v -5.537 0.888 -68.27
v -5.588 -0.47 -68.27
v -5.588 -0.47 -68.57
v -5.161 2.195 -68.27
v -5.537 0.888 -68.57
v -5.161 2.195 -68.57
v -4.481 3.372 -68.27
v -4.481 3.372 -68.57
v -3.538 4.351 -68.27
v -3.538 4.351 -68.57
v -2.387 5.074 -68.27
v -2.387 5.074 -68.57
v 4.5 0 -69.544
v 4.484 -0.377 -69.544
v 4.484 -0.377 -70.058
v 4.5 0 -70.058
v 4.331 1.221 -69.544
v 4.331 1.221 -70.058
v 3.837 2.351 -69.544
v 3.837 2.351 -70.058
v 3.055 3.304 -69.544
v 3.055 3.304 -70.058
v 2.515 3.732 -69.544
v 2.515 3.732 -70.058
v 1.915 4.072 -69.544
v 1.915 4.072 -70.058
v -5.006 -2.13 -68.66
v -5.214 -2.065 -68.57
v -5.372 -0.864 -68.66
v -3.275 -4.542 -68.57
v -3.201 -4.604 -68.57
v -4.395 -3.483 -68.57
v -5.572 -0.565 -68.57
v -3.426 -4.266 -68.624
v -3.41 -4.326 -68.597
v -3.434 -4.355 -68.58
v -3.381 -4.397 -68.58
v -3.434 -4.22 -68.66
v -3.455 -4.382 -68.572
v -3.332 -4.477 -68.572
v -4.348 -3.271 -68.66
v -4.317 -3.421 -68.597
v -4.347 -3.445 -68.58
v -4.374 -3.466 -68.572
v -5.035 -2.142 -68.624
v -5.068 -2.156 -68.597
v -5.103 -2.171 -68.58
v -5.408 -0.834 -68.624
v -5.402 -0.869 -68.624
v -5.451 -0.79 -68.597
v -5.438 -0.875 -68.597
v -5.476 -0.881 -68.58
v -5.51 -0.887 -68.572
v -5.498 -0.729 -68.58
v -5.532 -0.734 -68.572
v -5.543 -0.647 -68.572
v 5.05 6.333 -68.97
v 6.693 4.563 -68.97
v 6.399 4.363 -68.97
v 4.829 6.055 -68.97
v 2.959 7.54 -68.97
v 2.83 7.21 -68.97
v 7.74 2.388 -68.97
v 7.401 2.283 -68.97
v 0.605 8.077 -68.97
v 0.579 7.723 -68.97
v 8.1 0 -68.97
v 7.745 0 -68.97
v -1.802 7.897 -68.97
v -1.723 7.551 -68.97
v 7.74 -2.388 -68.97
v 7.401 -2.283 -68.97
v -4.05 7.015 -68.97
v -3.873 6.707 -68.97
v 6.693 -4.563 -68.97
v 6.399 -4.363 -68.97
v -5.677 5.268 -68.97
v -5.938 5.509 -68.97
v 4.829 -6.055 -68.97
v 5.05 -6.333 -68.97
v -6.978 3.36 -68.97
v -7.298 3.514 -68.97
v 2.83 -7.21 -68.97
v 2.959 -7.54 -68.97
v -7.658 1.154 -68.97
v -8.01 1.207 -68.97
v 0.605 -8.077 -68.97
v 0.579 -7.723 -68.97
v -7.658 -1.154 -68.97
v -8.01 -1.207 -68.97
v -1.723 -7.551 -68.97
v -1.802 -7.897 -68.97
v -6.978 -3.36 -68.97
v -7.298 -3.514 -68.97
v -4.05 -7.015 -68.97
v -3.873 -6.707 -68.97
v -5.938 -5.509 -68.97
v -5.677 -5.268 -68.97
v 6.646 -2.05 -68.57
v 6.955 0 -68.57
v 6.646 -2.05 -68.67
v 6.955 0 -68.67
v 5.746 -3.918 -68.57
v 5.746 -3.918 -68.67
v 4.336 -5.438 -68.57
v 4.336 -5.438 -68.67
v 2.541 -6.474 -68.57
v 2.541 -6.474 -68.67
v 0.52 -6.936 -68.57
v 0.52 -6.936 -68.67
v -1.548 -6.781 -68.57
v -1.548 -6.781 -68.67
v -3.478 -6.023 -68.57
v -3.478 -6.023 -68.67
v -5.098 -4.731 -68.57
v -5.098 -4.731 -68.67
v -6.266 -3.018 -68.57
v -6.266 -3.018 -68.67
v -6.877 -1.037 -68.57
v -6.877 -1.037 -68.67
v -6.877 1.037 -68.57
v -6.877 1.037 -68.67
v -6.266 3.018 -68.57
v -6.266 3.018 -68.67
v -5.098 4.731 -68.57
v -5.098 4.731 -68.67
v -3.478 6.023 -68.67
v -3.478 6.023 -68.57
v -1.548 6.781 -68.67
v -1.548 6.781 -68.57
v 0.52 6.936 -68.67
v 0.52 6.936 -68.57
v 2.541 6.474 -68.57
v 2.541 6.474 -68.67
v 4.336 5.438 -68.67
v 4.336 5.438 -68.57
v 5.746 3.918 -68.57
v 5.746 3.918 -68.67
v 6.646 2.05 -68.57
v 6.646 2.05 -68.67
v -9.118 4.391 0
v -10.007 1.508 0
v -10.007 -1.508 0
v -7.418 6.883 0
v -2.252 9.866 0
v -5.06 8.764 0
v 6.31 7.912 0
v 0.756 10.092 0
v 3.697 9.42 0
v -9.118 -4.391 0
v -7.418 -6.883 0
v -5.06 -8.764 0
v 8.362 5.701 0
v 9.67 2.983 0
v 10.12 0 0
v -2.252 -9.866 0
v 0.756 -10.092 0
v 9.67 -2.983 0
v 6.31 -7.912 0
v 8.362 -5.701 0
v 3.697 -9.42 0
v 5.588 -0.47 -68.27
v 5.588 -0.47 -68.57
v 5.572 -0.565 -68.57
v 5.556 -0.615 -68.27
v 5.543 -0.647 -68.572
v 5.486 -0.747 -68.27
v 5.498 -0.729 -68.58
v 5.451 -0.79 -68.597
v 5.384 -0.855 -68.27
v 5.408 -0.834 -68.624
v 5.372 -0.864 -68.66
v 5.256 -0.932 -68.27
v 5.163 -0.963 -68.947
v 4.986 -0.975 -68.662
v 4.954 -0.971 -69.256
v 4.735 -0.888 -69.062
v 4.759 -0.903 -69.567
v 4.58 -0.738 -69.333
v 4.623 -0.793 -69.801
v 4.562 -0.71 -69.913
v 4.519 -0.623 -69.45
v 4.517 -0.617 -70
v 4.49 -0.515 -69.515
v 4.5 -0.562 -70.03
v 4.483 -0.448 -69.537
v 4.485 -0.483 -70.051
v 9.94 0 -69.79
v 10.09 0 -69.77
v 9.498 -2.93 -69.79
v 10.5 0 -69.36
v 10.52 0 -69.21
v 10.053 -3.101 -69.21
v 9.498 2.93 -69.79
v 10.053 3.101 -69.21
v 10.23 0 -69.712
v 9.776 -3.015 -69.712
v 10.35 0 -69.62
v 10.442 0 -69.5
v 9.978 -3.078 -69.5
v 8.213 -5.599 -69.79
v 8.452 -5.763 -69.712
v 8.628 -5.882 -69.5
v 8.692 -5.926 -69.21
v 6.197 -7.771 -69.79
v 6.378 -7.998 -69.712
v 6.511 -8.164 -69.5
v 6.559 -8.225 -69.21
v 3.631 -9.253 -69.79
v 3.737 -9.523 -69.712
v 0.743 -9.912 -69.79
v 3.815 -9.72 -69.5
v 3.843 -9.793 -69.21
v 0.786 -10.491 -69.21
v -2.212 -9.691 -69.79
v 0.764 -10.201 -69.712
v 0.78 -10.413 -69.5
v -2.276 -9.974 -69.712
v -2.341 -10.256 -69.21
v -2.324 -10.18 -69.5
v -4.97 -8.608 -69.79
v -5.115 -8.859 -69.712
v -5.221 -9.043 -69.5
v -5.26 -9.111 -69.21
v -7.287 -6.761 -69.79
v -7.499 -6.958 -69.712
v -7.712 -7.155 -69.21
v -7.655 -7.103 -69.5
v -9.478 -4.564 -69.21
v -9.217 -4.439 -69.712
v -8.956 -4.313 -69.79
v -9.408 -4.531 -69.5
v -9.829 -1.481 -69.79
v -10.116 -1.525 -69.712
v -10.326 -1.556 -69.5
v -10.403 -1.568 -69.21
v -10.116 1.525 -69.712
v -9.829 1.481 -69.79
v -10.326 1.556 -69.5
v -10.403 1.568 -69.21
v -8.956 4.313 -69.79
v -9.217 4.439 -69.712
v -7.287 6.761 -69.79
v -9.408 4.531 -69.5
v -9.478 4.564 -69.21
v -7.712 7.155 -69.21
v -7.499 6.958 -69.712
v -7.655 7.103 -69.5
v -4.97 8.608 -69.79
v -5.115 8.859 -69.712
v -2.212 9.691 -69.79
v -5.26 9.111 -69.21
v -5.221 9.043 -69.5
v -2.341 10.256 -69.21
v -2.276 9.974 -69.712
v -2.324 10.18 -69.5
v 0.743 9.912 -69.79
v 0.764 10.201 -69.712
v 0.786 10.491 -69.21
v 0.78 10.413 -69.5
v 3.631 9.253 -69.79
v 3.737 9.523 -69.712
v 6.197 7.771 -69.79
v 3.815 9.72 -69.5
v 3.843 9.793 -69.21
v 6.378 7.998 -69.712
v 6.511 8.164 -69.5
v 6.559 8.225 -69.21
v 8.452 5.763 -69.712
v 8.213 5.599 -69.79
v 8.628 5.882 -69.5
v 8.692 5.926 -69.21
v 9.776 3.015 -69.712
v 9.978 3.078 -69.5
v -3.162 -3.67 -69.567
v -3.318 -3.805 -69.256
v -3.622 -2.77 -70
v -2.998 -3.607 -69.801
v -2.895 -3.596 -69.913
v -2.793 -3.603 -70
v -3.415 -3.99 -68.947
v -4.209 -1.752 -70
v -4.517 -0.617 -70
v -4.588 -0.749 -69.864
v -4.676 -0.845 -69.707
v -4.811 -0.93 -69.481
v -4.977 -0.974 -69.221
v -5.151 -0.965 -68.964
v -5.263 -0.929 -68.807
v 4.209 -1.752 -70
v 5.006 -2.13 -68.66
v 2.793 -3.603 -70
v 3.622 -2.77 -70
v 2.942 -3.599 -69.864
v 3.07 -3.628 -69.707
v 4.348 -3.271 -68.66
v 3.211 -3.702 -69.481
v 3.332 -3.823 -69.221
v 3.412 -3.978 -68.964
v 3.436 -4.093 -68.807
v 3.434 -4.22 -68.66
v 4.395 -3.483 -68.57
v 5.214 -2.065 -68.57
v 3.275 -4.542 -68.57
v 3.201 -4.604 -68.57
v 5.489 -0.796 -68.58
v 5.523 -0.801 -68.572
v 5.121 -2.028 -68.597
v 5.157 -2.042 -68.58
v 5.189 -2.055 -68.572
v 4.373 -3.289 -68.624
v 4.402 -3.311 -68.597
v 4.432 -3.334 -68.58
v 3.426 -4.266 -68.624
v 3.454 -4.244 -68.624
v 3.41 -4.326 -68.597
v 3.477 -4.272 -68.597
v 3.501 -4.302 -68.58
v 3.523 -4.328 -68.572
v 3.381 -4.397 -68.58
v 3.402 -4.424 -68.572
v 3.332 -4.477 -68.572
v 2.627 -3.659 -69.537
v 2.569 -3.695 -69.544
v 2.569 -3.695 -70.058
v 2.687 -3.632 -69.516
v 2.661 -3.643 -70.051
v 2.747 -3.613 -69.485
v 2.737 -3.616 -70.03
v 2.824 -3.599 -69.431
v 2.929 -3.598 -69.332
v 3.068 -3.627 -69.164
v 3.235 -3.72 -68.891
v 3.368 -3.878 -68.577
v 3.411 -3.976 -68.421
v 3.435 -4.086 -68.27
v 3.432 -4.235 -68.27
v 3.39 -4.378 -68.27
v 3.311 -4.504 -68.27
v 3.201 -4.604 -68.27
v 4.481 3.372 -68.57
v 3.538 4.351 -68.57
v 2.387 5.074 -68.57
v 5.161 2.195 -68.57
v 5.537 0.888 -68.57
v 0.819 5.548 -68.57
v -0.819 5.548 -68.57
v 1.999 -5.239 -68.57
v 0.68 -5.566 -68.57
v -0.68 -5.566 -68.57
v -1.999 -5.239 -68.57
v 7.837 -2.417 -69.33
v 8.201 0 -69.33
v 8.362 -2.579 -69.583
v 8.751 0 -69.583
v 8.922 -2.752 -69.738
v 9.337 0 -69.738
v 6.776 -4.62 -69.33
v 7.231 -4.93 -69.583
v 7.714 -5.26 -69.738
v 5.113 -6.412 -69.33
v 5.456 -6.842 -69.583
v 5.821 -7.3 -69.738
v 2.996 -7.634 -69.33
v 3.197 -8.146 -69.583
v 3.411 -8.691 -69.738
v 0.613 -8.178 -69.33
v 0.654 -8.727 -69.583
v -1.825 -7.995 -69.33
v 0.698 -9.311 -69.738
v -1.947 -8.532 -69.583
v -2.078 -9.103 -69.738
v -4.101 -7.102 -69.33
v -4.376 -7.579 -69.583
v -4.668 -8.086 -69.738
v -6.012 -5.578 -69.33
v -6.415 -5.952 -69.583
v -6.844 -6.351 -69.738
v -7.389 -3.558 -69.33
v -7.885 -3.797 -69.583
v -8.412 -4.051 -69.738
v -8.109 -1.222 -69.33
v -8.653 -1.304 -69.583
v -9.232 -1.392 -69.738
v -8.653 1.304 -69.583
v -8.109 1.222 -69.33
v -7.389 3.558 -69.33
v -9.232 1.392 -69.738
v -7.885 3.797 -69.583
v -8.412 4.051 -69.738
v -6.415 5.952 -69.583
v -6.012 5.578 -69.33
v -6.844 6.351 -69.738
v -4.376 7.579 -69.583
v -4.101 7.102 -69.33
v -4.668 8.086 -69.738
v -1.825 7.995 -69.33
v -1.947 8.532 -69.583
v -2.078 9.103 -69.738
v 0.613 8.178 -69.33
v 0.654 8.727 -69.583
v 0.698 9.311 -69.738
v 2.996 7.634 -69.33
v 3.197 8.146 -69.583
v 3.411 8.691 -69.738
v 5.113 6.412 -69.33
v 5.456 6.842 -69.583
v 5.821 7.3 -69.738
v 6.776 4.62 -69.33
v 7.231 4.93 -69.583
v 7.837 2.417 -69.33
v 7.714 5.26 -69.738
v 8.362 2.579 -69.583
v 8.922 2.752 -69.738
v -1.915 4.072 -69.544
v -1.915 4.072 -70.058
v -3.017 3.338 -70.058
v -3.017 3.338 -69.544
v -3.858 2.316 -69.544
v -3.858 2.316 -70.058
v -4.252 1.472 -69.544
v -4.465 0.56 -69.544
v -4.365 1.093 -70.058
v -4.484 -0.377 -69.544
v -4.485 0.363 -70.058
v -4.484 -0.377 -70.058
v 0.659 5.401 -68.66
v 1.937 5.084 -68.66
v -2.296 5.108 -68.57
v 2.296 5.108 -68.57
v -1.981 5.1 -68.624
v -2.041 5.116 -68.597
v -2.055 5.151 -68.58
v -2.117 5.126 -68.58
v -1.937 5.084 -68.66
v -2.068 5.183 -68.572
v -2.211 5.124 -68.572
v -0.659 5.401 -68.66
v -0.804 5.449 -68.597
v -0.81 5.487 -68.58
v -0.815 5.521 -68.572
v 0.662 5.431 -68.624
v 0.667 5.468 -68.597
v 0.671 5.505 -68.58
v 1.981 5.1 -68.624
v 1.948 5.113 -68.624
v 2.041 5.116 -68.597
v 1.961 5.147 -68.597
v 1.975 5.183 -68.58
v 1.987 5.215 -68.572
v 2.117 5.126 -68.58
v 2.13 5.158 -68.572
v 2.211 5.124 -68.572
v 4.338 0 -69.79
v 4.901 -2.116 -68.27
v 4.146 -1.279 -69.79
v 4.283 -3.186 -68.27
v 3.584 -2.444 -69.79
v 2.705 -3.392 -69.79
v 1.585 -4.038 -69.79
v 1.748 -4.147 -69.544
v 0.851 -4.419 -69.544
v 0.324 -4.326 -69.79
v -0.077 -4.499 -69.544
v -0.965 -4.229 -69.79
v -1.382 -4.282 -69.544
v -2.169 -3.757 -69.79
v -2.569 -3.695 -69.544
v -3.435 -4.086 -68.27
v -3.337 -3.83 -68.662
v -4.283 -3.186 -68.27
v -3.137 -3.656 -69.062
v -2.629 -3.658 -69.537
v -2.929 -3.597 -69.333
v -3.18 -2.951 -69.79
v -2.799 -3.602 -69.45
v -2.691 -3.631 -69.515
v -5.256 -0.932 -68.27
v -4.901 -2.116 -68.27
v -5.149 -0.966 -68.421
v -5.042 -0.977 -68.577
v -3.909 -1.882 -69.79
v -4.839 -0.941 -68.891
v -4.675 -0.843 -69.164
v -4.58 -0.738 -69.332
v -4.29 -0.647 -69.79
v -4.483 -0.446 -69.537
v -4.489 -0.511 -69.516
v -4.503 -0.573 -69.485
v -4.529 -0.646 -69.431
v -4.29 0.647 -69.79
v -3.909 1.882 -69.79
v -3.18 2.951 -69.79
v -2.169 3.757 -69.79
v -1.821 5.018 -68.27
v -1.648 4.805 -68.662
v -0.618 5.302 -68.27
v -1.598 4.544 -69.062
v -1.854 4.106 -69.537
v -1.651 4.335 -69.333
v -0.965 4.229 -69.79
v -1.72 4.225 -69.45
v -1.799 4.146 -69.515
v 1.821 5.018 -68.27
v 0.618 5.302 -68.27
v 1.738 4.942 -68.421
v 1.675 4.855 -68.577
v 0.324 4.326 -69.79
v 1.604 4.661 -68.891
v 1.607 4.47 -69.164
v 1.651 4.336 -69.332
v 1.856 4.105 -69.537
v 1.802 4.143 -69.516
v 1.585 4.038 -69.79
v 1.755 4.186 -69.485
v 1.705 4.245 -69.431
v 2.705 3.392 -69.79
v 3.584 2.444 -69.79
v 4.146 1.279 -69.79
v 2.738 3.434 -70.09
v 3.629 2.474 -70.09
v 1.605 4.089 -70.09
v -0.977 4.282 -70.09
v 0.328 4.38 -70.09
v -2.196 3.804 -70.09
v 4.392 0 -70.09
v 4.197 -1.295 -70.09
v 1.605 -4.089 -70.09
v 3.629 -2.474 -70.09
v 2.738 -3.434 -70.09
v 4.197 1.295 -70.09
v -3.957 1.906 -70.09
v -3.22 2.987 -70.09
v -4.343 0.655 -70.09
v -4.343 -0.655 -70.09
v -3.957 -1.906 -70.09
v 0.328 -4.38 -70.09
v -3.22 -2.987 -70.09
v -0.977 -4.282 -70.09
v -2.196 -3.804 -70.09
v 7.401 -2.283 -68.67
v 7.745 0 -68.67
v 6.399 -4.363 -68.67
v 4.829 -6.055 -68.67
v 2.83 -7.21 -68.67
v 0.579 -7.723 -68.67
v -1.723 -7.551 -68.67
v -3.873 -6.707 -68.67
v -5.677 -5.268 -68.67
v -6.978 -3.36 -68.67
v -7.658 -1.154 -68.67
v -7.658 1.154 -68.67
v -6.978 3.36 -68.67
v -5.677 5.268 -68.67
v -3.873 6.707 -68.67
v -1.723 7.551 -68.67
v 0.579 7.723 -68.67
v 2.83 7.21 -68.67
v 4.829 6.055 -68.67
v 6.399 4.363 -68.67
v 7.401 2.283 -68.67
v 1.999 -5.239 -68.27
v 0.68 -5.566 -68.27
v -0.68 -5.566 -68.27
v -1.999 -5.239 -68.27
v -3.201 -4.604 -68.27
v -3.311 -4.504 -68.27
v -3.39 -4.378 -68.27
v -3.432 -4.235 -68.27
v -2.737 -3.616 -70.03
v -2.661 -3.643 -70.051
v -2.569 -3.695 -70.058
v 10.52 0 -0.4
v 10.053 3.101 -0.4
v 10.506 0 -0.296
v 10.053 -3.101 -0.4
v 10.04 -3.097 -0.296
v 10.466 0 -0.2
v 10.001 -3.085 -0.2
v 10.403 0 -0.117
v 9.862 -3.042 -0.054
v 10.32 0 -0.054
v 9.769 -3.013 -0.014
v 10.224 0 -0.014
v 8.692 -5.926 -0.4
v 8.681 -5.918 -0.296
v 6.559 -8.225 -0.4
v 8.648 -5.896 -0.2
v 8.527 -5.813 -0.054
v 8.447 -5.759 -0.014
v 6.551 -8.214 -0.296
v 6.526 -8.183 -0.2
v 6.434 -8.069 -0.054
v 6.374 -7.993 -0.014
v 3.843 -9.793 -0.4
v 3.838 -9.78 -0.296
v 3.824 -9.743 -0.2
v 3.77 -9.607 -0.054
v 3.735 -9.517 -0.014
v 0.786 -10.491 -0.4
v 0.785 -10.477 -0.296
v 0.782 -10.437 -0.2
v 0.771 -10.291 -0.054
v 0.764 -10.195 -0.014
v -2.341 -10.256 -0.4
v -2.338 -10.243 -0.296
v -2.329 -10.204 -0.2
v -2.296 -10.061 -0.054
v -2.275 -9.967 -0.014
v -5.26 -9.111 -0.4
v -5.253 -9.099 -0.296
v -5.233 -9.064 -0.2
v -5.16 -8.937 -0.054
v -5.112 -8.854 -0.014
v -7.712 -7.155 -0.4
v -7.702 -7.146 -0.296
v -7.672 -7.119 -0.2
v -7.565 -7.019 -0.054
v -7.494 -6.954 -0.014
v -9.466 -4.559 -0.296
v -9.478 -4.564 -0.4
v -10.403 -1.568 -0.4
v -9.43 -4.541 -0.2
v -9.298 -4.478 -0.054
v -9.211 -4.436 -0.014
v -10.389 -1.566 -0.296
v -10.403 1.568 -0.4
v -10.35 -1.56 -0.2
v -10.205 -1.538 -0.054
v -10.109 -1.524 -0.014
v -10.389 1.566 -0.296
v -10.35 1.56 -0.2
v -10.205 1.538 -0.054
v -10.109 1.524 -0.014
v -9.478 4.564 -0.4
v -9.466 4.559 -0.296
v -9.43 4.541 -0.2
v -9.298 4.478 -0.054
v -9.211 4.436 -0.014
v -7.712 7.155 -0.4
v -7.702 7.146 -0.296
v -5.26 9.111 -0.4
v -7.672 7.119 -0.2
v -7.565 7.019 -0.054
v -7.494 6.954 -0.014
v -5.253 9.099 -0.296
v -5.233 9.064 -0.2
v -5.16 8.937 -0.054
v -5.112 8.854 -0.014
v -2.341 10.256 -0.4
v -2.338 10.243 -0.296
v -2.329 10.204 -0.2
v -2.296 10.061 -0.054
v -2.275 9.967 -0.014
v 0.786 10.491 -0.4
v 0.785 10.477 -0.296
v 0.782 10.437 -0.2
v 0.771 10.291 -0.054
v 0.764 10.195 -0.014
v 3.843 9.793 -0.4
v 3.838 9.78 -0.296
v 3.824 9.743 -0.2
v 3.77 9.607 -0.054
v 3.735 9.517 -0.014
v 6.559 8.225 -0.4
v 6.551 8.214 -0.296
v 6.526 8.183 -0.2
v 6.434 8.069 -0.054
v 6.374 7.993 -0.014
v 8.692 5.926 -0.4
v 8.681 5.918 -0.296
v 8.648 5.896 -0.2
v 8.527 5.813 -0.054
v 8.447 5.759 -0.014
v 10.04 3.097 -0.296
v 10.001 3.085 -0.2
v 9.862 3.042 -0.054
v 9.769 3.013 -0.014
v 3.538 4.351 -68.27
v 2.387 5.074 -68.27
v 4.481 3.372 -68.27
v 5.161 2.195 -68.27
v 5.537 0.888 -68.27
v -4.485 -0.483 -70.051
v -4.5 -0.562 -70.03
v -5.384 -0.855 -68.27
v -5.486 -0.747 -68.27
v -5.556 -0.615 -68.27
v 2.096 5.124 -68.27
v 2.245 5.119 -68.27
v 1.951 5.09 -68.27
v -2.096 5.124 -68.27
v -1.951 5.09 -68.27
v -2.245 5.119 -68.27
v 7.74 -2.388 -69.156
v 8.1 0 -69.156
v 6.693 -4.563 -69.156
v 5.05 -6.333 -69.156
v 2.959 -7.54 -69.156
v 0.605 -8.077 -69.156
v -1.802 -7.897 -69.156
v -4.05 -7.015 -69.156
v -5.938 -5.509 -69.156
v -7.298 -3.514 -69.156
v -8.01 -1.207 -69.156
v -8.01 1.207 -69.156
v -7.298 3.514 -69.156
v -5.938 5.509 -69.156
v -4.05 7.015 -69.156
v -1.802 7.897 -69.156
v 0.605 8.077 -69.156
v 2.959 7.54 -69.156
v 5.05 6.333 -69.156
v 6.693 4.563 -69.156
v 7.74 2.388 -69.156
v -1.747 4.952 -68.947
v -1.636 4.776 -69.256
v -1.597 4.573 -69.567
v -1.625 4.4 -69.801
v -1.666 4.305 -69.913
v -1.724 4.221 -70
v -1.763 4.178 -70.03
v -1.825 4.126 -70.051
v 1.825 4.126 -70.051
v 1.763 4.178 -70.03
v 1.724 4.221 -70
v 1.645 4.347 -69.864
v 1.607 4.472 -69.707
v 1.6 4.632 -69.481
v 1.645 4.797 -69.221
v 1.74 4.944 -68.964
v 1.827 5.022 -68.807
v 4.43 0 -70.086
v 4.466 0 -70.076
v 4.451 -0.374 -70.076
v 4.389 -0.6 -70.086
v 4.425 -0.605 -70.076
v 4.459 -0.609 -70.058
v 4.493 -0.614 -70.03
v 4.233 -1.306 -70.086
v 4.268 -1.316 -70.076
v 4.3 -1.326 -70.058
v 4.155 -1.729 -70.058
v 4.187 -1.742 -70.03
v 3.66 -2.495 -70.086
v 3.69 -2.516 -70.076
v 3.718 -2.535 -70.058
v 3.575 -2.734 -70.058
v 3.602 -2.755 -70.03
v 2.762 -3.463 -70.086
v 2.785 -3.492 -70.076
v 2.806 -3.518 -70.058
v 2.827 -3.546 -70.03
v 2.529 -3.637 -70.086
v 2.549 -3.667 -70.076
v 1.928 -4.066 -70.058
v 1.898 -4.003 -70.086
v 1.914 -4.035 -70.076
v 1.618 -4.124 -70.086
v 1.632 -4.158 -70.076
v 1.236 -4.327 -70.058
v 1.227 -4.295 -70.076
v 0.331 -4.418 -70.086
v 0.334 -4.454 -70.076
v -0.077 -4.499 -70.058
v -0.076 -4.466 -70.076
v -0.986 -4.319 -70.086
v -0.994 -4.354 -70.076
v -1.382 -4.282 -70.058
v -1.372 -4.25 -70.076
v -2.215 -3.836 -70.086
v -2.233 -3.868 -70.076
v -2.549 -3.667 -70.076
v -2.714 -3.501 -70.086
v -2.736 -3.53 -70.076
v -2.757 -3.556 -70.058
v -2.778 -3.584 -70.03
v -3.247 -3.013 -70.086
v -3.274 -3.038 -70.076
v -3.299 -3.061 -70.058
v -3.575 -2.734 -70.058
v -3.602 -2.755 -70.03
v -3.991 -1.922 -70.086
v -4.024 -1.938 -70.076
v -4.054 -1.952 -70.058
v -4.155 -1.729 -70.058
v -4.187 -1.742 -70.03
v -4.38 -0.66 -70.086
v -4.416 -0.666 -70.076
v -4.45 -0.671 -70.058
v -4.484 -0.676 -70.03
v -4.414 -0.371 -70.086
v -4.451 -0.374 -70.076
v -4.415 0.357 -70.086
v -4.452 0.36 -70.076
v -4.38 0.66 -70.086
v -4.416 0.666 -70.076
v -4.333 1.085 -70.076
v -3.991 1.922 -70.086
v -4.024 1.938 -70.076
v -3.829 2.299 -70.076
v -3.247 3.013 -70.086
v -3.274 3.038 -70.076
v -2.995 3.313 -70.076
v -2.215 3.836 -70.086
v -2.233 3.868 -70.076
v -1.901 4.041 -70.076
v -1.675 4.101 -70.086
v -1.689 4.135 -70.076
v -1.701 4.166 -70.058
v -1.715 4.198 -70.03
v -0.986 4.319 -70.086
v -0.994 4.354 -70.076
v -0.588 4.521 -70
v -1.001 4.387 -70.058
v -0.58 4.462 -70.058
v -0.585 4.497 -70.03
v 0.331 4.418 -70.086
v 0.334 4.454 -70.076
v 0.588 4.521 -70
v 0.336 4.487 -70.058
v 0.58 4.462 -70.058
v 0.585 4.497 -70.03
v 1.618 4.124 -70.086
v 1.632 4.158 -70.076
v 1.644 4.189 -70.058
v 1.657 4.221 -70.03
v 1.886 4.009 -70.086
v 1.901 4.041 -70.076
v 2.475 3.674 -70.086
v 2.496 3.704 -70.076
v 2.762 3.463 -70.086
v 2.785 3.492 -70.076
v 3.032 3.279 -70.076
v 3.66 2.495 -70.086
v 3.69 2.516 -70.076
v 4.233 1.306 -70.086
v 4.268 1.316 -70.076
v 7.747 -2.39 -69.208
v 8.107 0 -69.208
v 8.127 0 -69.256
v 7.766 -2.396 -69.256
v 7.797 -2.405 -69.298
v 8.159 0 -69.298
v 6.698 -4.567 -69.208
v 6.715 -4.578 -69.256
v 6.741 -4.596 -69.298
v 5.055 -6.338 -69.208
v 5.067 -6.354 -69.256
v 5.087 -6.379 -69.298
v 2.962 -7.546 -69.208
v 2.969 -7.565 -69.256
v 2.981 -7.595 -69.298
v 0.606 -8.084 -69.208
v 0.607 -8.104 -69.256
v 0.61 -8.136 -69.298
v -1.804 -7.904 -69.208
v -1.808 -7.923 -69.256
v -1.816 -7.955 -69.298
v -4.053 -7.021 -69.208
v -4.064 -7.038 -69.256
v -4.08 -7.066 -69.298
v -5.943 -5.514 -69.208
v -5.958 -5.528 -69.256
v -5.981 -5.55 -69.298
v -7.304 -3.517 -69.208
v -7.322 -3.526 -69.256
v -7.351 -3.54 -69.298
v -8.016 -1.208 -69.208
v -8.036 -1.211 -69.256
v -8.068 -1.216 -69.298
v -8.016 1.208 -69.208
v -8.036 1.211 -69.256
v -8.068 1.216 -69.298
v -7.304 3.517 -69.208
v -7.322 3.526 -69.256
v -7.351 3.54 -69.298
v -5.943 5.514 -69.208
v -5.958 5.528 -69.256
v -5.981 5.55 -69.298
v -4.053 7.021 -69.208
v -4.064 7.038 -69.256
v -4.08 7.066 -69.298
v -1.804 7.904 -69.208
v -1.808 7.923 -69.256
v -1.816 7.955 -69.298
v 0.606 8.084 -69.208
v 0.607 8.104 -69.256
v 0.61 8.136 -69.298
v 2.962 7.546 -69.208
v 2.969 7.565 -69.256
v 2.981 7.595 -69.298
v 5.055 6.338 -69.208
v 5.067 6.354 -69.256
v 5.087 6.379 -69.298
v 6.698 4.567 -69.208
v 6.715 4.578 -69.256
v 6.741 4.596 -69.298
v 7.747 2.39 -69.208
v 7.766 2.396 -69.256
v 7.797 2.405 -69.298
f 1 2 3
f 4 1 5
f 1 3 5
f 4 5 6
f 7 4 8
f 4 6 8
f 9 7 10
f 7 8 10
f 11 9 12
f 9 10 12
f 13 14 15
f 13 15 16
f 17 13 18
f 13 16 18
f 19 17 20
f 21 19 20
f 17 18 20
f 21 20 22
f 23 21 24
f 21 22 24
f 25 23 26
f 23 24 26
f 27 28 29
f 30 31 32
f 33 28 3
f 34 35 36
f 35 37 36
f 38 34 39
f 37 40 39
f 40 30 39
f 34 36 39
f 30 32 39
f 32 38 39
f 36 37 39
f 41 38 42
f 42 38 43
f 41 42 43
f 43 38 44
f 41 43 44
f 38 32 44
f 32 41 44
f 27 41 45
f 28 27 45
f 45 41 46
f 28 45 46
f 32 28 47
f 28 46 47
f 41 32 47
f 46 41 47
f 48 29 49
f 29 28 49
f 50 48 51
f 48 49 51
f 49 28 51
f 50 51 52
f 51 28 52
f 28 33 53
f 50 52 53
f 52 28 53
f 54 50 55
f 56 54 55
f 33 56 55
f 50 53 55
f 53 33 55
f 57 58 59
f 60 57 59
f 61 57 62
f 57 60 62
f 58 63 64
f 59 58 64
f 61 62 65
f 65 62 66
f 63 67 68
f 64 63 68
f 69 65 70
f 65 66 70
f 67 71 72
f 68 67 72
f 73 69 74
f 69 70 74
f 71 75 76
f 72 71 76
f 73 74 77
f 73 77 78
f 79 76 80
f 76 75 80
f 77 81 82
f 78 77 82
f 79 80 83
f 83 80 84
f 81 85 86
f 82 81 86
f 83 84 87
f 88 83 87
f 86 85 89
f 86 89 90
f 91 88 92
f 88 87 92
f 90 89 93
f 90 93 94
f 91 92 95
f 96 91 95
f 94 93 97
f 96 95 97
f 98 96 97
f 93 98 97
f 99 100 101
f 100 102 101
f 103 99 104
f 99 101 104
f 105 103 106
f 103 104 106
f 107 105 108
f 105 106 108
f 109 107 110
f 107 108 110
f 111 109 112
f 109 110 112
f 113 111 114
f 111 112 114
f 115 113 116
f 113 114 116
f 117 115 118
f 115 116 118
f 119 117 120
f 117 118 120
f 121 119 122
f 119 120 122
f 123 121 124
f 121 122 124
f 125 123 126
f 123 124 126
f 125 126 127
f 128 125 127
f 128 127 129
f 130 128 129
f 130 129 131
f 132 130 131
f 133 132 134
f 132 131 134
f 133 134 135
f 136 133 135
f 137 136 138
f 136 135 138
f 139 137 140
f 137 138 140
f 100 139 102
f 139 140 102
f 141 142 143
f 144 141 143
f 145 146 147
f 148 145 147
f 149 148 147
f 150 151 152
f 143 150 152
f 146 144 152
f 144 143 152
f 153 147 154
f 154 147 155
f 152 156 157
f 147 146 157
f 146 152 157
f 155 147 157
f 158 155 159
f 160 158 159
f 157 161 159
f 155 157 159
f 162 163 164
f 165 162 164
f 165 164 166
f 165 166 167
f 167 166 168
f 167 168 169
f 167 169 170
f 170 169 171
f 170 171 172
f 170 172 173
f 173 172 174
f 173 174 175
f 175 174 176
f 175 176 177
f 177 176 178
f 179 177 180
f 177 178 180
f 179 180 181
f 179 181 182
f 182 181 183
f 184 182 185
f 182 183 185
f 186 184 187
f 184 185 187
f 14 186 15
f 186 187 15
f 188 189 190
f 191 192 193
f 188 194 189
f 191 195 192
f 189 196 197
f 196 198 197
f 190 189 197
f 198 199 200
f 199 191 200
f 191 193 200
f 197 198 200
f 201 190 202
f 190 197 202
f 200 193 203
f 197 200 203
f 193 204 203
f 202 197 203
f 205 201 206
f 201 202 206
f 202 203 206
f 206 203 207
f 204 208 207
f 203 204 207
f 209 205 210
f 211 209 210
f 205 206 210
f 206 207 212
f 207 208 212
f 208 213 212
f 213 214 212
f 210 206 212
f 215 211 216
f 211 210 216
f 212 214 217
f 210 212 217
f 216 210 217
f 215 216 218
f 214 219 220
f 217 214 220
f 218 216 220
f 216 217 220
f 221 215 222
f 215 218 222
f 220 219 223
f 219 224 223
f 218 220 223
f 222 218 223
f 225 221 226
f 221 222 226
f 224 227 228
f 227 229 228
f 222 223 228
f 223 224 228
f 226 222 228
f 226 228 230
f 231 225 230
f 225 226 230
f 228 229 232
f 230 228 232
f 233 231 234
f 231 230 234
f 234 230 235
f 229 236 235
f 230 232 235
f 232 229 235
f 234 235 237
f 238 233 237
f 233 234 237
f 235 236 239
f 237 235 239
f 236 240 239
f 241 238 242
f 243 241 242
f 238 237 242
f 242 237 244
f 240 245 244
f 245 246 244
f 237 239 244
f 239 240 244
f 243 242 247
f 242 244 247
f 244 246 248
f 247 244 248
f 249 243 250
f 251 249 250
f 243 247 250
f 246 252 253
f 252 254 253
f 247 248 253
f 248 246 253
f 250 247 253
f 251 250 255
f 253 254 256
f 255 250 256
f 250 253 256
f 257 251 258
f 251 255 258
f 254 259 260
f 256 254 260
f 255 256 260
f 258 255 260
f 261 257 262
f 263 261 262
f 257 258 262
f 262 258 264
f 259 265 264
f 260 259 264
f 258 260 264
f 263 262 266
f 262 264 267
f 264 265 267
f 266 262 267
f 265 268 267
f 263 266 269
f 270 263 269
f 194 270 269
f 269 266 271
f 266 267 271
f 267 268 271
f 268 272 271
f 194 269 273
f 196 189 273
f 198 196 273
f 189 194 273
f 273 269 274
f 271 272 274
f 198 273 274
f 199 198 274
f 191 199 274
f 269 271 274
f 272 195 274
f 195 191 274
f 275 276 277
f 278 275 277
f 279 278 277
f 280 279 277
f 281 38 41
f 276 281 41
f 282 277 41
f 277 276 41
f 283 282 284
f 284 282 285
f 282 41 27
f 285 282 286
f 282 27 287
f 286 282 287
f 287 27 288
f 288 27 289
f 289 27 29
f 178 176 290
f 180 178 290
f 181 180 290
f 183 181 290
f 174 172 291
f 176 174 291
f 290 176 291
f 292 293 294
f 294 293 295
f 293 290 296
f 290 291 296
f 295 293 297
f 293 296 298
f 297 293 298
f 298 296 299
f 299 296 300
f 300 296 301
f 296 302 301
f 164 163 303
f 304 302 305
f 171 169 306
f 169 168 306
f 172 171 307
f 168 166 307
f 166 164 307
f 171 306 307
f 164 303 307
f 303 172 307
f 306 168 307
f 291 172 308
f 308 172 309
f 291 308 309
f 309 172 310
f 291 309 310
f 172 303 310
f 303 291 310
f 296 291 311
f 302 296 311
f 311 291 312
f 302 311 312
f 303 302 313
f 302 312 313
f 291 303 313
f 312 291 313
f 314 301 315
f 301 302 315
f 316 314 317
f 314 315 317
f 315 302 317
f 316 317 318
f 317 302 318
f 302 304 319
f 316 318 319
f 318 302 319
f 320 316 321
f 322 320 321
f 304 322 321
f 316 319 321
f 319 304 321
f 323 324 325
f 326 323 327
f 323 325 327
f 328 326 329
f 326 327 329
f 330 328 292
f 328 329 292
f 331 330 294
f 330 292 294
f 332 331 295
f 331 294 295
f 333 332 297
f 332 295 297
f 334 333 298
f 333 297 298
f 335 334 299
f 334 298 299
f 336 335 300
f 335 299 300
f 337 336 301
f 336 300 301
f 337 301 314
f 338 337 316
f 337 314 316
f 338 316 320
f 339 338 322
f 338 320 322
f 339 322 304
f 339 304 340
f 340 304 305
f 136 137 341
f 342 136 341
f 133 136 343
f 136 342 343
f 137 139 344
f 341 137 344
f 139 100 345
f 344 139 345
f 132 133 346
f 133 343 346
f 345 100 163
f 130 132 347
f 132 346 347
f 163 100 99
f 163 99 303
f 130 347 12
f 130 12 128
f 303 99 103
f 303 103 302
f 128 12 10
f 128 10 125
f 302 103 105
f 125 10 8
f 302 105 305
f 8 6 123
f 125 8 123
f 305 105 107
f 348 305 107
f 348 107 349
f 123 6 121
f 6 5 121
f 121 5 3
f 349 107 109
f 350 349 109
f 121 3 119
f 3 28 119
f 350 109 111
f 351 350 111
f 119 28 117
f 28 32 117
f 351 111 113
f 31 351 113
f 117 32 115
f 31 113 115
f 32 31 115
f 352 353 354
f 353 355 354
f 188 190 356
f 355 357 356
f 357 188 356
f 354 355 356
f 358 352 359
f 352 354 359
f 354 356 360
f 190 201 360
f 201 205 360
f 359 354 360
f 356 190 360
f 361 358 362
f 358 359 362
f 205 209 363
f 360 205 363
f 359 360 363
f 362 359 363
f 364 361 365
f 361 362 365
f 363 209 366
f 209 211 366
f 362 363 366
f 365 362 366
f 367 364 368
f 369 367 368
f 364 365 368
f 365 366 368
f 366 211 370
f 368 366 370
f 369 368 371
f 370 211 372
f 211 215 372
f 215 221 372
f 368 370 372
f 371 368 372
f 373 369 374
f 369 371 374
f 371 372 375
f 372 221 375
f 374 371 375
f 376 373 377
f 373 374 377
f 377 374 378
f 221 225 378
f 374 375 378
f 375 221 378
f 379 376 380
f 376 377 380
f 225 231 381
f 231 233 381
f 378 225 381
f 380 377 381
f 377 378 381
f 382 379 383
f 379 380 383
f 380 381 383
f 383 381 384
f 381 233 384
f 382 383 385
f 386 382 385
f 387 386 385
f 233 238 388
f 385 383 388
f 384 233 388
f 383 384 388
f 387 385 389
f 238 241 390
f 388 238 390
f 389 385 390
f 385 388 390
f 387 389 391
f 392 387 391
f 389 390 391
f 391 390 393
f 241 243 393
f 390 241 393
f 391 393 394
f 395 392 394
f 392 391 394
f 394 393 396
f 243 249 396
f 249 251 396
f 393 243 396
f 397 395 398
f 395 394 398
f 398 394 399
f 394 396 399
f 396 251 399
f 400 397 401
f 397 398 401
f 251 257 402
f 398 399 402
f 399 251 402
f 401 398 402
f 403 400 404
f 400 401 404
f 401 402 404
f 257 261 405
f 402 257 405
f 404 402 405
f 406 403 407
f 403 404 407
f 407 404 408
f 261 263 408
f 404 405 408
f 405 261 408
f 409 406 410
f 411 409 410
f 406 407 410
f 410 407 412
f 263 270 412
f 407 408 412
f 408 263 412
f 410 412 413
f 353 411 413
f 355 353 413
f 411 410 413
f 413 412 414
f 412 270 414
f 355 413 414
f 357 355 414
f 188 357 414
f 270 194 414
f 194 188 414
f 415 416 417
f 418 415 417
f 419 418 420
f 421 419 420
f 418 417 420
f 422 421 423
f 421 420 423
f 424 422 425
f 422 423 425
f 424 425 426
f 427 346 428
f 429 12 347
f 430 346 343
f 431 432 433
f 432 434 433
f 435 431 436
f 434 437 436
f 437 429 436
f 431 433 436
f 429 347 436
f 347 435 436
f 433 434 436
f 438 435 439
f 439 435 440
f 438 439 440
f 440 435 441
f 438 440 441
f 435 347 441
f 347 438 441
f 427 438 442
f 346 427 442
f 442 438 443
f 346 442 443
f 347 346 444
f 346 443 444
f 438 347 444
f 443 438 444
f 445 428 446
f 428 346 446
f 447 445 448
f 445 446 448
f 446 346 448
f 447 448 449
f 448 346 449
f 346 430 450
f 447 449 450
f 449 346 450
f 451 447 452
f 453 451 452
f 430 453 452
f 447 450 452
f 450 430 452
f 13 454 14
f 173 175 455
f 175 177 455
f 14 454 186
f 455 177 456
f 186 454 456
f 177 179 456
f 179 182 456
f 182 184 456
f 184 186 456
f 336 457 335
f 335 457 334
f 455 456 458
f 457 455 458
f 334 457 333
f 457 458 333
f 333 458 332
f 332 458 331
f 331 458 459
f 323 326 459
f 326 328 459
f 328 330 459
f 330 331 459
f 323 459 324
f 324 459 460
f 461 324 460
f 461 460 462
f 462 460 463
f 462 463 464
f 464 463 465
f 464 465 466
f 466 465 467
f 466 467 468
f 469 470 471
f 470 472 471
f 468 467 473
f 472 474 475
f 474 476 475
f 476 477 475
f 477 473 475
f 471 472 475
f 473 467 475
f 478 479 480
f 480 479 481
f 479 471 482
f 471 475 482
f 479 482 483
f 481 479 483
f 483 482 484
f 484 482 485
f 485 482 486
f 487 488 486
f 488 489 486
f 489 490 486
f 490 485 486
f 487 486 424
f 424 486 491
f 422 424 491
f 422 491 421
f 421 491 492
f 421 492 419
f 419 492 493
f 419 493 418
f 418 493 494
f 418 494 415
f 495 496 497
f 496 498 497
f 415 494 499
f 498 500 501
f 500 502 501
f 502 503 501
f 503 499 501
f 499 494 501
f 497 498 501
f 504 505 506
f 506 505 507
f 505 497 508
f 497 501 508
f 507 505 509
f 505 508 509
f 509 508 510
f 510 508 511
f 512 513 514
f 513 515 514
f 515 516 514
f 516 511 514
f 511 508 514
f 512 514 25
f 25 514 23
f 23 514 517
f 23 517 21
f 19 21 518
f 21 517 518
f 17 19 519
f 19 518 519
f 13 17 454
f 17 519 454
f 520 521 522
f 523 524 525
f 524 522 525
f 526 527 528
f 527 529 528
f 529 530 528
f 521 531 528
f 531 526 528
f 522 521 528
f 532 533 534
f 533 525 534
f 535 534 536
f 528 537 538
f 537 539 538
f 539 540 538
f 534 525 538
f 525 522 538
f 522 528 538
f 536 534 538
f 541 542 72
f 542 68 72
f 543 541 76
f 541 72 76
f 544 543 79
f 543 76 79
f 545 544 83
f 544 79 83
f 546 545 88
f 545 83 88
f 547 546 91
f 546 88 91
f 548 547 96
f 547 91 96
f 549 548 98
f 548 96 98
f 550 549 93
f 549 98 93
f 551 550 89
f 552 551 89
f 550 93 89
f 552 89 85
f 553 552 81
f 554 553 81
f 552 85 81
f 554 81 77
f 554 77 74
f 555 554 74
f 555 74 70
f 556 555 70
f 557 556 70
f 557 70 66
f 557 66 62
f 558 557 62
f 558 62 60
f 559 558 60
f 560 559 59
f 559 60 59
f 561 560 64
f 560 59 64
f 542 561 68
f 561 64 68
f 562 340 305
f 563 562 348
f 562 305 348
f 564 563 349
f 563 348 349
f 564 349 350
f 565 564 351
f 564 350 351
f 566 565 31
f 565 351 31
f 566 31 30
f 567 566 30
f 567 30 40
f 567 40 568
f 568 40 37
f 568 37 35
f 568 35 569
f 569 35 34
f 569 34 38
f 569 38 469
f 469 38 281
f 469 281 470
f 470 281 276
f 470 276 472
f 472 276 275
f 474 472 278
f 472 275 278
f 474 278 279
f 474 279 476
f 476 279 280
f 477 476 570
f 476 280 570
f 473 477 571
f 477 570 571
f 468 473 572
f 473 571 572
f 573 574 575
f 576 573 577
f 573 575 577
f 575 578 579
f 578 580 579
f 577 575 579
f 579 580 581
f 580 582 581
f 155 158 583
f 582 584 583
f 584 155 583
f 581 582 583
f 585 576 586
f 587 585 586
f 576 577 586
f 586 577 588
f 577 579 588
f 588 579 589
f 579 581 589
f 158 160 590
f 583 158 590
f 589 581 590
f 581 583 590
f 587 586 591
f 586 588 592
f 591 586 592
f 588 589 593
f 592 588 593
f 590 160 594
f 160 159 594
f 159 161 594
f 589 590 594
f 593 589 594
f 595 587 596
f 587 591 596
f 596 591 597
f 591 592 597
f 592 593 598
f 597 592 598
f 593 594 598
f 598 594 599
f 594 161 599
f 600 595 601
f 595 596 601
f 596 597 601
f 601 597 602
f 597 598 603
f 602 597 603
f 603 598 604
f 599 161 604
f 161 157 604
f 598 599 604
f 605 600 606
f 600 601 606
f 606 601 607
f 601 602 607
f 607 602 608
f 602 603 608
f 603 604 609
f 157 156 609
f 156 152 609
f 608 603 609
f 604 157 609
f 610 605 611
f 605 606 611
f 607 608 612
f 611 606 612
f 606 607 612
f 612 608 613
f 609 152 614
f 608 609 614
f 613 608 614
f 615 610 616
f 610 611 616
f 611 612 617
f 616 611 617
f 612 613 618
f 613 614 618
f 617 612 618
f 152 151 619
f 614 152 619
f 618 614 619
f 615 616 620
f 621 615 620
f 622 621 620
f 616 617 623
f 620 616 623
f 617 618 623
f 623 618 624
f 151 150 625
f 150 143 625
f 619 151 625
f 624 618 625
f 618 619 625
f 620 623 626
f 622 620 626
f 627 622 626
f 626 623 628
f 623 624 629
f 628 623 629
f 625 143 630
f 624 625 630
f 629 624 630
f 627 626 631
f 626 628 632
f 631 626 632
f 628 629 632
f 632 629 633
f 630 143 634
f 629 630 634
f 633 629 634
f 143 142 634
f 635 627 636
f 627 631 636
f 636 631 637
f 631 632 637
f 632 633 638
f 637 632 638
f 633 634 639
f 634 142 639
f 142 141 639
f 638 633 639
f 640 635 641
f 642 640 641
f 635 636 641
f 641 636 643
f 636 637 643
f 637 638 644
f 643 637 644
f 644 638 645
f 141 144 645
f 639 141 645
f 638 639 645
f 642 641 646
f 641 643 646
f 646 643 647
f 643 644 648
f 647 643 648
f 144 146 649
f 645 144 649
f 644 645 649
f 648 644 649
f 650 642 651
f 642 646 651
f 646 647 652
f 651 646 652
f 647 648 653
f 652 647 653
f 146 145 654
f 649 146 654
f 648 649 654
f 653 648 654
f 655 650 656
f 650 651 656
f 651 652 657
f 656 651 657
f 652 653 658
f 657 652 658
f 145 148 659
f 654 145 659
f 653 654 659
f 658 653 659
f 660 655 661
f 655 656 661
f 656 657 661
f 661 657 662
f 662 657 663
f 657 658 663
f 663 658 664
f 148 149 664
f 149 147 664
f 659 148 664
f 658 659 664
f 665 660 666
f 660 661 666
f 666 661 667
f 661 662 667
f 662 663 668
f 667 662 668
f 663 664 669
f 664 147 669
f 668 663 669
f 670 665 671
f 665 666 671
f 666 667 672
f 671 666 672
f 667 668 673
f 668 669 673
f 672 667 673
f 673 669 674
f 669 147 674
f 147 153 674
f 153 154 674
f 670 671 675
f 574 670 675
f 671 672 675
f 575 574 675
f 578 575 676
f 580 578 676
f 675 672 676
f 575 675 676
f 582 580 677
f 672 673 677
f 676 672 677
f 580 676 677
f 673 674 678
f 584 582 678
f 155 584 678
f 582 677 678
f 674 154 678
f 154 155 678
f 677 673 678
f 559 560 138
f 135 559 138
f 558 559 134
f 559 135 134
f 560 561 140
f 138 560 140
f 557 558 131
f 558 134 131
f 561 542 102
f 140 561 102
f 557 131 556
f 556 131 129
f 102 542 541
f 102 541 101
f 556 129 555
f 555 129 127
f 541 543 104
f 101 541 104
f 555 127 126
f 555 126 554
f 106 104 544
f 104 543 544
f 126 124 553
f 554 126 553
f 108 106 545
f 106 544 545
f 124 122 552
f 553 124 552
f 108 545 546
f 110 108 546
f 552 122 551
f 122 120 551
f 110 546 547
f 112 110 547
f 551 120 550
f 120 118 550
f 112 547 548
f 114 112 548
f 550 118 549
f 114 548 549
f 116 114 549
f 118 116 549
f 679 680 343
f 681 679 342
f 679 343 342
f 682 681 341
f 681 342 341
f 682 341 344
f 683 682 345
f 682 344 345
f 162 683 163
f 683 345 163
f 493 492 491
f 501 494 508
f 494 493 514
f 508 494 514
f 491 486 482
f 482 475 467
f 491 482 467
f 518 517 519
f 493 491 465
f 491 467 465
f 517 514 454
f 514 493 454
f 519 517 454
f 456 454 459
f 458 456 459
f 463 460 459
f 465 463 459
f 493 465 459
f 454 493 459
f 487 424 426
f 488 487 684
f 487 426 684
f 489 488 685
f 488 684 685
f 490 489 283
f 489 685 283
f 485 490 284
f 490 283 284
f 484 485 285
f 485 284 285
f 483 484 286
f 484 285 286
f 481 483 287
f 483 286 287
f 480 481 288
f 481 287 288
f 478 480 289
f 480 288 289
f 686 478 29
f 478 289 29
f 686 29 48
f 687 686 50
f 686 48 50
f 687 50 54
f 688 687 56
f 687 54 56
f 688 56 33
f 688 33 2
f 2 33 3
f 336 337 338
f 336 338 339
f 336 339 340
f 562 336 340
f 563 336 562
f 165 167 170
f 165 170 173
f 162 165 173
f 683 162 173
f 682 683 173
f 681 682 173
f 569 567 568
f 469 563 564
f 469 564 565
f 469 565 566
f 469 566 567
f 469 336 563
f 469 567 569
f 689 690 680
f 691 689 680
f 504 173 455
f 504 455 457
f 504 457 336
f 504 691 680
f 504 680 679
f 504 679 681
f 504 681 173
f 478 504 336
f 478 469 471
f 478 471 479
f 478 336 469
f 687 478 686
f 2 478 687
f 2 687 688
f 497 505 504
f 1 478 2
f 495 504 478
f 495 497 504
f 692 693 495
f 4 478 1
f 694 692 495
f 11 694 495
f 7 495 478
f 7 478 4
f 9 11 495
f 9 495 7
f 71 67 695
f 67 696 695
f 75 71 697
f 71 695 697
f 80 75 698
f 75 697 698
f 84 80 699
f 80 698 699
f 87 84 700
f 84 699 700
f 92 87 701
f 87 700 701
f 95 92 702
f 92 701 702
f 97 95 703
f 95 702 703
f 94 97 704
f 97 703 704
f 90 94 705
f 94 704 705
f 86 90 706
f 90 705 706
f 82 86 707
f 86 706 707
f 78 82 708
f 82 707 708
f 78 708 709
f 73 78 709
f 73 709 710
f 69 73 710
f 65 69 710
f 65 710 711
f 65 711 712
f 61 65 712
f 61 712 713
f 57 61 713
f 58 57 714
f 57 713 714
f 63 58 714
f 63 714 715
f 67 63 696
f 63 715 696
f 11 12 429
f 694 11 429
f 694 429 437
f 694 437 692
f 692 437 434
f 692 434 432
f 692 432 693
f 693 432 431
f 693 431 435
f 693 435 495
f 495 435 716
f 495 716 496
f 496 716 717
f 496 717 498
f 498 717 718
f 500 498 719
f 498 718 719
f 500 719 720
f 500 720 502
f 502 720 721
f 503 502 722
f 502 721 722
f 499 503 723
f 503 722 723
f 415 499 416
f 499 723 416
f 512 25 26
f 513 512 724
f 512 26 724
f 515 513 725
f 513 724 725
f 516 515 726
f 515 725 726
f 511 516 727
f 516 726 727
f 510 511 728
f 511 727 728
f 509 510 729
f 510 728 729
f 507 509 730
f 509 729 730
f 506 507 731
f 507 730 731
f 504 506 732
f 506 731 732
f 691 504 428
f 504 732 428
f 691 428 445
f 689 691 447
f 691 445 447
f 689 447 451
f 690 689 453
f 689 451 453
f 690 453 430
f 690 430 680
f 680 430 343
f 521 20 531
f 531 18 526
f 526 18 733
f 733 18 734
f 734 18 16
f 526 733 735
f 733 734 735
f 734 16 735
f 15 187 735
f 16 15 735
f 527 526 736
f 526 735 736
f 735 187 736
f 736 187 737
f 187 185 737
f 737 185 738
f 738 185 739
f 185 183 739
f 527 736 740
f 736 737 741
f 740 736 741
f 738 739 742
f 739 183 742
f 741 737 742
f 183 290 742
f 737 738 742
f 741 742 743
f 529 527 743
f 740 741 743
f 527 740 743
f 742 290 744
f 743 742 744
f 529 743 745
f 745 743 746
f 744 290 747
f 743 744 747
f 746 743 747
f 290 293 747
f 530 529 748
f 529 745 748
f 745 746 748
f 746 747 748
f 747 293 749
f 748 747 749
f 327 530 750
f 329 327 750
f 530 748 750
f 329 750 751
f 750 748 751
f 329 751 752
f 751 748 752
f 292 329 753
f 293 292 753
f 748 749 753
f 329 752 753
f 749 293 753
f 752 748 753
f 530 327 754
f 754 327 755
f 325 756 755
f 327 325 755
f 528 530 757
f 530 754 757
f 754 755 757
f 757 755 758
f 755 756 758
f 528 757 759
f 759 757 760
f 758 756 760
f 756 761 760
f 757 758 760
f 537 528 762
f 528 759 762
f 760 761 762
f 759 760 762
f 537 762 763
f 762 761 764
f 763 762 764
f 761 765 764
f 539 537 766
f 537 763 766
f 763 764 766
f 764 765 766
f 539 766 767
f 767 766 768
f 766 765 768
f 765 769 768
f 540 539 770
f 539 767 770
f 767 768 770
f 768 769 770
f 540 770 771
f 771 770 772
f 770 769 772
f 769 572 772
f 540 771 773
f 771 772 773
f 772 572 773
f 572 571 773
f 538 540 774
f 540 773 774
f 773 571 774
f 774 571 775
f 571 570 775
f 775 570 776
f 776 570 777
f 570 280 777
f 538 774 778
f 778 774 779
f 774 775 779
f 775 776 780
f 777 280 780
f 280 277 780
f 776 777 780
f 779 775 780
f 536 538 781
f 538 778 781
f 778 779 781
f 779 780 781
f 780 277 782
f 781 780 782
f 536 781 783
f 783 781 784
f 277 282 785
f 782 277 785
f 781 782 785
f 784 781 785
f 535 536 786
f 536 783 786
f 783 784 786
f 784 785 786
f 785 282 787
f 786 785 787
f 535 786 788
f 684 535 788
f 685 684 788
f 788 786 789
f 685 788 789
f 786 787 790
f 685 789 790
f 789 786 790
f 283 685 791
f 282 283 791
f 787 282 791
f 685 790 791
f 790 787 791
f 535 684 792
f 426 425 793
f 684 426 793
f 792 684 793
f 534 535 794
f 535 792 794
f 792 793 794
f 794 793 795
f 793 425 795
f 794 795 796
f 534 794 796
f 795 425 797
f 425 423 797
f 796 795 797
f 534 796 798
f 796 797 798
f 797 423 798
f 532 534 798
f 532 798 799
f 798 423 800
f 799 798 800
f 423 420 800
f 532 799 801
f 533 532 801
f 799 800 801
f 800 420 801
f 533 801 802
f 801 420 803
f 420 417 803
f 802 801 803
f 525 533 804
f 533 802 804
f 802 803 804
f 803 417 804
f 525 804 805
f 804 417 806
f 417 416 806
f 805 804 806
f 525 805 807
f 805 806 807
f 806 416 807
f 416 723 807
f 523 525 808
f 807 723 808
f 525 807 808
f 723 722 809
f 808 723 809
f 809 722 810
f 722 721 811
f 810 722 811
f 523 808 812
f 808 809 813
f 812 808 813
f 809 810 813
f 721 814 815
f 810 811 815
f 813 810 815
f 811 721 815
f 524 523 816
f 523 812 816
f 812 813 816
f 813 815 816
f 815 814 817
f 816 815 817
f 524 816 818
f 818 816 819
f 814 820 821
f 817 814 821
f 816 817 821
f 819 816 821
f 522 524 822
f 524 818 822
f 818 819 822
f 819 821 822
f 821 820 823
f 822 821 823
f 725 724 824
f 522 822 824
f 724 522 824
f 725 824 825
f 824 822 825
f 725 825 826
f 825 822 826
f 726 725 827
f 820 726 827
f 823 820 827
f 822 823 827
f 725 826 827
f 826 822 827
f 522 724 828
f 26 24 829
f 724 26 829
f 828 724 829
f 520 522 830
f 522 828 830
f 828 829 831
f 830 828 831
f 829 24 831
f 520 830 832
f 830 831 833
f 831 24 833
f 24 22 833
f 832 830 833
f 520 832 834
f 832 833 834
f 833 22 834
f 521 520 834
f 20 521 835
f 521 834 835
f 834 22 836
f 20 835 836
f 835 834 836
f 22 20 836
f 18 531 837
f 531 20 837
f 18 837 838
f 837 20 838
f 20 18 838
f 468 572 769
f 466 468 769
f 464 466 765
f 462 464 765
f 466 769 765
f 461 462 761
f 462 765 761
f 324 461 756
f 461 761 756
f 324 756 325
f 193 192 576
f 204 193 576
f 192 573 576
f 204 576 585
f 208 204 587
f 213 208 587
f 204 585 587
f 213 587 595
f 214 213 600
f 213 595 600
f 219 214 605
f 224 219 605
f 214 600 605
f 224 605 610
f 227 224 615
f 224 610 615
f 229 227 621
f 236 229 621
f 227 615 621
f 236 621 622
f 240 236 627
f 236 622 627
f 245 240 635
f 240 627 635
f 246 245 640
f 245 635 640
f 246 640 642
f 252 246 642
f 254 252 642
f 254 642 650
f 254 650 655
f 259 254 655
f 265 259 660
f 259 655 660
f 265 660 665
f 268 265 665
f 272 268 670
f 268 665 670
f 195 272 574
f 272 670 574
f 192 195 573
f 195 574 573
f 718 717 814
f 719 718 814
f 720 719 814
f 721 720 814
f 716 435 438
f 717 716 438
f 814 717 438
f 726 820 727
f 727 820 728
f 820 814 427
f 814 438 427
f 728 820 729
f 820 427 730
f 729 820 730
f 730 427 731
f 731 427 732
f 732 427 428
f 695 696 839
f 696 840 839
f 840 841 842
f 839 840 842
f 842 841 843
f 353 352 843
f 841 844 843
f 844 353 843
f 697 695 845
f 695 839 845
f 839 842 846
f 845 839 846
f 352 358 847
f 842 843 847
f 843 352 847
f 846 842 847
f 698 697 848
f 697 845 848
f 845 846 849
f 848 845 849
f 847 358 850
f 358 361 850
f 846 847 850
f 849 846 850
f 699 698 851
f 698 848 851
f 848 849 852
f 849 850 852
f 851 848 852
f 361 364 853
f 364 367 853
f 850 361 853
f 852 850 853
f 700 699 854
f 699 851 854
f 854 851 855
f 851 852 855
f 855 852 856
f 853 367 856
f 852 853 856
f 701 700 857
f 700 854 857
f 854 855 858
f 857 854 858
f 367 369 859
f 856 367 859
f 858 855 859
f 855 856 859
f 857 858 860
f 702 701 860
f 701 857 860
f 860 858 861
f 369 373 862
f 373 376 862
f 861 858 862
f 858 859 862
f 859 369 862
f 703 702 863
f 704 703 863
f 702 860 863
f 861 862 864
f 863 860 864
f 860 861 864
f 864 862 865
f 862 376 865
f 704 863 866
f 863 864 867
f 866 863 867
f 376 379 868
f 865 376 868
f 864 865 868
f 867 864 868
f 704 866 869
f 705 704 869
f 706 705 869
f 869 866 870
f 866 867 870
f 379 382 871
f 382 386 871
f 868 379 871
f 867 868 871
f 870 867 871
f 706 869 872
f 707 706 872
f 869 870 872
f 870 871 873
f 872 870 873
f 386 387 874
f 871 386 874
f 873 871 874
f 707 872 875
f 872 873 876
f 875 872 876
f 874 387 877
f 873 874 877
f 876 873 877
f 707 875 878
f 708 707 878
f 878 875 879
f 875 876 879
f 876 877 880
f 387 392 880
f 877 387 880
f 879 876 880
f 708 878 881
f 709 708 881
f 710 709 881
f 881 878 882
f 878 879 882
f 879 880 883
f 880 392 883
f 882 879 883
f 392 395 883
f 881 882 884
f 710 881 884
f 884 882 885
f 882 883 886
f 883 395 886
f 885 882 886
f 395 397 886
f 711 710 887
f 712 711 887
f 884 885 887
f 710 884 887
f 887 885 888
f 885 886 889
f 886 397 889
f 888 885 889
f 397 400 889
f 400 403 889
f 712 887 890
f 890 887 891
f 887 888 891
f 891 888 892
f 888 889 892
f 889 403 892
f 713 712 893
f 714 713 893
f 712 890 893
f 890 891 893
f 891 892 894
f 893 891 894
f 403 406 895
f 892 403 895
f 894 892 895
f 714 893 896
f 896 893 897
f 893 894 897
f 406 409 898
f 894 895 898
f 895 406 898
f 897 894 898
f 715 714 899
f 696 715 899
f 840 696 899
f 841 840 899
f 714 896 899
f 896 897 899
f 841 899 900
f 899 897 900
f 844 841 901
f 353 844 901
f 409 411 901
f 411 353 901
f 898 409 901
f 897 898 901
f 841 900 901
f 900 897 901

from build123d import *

# Parameters (mm, degrees)
CUT_EXTRUDE1_REACH = 73.652


with BuildPart() as part:
    # Sketch1 → Revolve1 (revolve)
    with BuildSketch(Plane(origin=(0, 0, 0), x_dir=(1, 0, 0), z_dir=(0, 1, 0))):
        with BuildLine():
            Line((0, 70.09), (4.39217757, 70.09))
            ThreePointArc((4.39217757, 70.09), (4.487086316, 70.066046386), (4.559260987, 69.9999233))
            Line((4.559260987, 69.9999233), (5.440739013, 68.6600767))
            ThreePointArc((5.440739013, 68.6600767), (5.512913684, 68.593953614), (5.60782243, 68.57))
            Line((5.60782243, 68.57), (6.955, 68.57))
            Line((6.955, 68.57), (6.955, 68.67))
            Line((6.955, 68.67), (7.745, 68.67))
            Line((7.745, 68.67), (7.745, 68.97))
            Line((7.745, 68.97), (8.1, 68.97))
            Line((8.1, 68.97), (8.1, 69.15596492))
            ThreePointArc((8.1, 69.15596492), (8.127103293, 69.256497147), (8.201067285, 69.32978183))
            ThreePointArc((8.201067285, 69.32978183), (9.040599123, 69.672998391), (9.94, 69.79))
            ThreePointArc((9.94, 69.79), (10.350121933, 69.620121933), (10.52, 69.21))
            Line((10.52, 69.21), (10.52, 0.4))
            ThreePointArc((10.52, 0.4), (10.402842712, 0.117157288), (10.12, 0))
            Line((10.12, 0), (0, 0))
            Line((0, 0), (0, 68.27))
            Line((0, 68.27), (5.338266355, 68.27))
            Line((5.338266355, 68.27), (4.338266355, 69.79))
            Line((4.338266355, 69.79), (0, 69.79))
            Line((0, 69.79), (0, 70.09))
        make_face()
    revolve(axis=Axis((0, 0, 0), (0, 0, -1)))

    # Cut-Extrude1: up to this face of the body (flat: up to its plane)
    cut_extrude1_end = Plane(part.part.faces().sort_by_distance((0, 0, -68.27))[0])
    # Sketch2 → Cut-Extrude1 (cut, up to the picked face)
    with BuildSketch(Plane(origin=(0, 0, -70.09), x_dir=(-1, 0, 0), z_dir=(0, 0, -1)), mode=Mode.PRIVATE) as cut_extrude1_sk1:
        with BuildLine():
            ThreePointArc((5.588090856, -0.470013816), (4.856516684, 2.803911215), (2.387001523, 5.074435548))
            ThreePointArc((2.387001523, 5.074435548), (1.65, 4.808984945), (1.915450603, 4.071983422))
            ThreePointArc((1.915450603, 4.071983422), (3.897114317, 2.25), (4.484166389, -0.377162829))
            ThreePointArc((4.484166389, -0.377162829), (4.989703129, -0.975550556), (5.588090856, -0.470013816))
        make_face()
    cut_extrude1_tool1 = split(extrude(cut_extrude1_sk1.sketch, amount=-CUT_EXTRUDE1_REACH, mode=Mode.PRIVATE), bisect_by=cut_extrude1_end, keep=Keep.BOTH, mode=Mode.PRIVATE)
    # Sketch2 → Cut-Extrude1 (cut, up to the picked face)
    with BuildSketch(Plane(origin=(0, 0, -70.09), x_dir=(-1, 0, 0), z_dir=(0, 0, -1)), mode=Mode.PRIVATE) as cut_extrude1_sk2:
        with BuildLine():
            ThreePointArc((-3.201089333, -4.604421732), (0, -5.60782243), (3.201089333, -4.604421732))
            ThreePointArc((3.201089333, -4.604421732), (3.339703129, -3.833434389), (2.568715786, -3.694820593))
            ThreePointArc((2.568715786, -3.694820593), (0, -4.5), (-2.568715786, -3.694820593))
            ThreePointArc((-2.568715786, -3.694820593), (-3.339703129, -3.833434389), (-3.201089333, -4.604421732))
        make_face()
    cut_extrude1_tool2 = split(extrude(cut_extrude1_sk2.sketch, amount=-CUT_EXTRUDE1_REACH, mode=Mode.PRIVATE), bisect_by=cut_extrude1_end, keep=Keep.BOTH, mode=Mode.PRIVATE)
    # Sketch2 → Cut-Extrude1 (cut, up to the picked face)
    with BuildSketch(Plane(origin=(0, 0, -70.09), x_dir=(-1, 0, 0), z_dir=(0, 0, -1)), mode=Mode.PRIVATE) as cut_extrude1_sk3:
        with BuildLine():
            ThreePointArc((-2.387001523, 5.074435548), (-4.856516684, 2.803911215), (-5.588090856, -0.470013816))
            ThreePointArc((-5.588090856, -0.470013816), (-4.989703129, -0.975550556), (-4.484166389, -0.377162829))
            ThreePointArc((-4.484166389, -0.377162829), (-3.897114317, 2.25), (-1.915450603, 4.071983422))
            ThreePointArc((-1.915450603, 4.071983422), (-1.65, 4.808984945), (-2.387001523, 5.074435548))
        make_face()
    cut_extrude1_tool3 = split(extrude(cut_extrude1_sk3.sketch, amount=-CUT_EXTRUDE1_REACH, mode=Mode.PRIVATE), bisect_by=cut_extrude1_end, keep=Keep.BOTH, mode=Mode.PRIVATE)
    add(cut_extrude1_tool1.solids().sort_by(Axis((-4.048123, 2.337185, -70.09), (0, 0, 1)))[0], mode=Mode.SUBTRACT)
    add(cut_extrude1_tool2.solids().sort_by(Axis((0, -4.67437, -70.09), (0, 0, 1)))[0], mode=Mode.SUBTRACT)
    add(cut_extrude1_tool3.solids().sort_by(Axis((4.048123, 2.337185, -70.09), (0, 0, 1)))[0], mode=Mode.SUBTRACT)


solid = part.part
